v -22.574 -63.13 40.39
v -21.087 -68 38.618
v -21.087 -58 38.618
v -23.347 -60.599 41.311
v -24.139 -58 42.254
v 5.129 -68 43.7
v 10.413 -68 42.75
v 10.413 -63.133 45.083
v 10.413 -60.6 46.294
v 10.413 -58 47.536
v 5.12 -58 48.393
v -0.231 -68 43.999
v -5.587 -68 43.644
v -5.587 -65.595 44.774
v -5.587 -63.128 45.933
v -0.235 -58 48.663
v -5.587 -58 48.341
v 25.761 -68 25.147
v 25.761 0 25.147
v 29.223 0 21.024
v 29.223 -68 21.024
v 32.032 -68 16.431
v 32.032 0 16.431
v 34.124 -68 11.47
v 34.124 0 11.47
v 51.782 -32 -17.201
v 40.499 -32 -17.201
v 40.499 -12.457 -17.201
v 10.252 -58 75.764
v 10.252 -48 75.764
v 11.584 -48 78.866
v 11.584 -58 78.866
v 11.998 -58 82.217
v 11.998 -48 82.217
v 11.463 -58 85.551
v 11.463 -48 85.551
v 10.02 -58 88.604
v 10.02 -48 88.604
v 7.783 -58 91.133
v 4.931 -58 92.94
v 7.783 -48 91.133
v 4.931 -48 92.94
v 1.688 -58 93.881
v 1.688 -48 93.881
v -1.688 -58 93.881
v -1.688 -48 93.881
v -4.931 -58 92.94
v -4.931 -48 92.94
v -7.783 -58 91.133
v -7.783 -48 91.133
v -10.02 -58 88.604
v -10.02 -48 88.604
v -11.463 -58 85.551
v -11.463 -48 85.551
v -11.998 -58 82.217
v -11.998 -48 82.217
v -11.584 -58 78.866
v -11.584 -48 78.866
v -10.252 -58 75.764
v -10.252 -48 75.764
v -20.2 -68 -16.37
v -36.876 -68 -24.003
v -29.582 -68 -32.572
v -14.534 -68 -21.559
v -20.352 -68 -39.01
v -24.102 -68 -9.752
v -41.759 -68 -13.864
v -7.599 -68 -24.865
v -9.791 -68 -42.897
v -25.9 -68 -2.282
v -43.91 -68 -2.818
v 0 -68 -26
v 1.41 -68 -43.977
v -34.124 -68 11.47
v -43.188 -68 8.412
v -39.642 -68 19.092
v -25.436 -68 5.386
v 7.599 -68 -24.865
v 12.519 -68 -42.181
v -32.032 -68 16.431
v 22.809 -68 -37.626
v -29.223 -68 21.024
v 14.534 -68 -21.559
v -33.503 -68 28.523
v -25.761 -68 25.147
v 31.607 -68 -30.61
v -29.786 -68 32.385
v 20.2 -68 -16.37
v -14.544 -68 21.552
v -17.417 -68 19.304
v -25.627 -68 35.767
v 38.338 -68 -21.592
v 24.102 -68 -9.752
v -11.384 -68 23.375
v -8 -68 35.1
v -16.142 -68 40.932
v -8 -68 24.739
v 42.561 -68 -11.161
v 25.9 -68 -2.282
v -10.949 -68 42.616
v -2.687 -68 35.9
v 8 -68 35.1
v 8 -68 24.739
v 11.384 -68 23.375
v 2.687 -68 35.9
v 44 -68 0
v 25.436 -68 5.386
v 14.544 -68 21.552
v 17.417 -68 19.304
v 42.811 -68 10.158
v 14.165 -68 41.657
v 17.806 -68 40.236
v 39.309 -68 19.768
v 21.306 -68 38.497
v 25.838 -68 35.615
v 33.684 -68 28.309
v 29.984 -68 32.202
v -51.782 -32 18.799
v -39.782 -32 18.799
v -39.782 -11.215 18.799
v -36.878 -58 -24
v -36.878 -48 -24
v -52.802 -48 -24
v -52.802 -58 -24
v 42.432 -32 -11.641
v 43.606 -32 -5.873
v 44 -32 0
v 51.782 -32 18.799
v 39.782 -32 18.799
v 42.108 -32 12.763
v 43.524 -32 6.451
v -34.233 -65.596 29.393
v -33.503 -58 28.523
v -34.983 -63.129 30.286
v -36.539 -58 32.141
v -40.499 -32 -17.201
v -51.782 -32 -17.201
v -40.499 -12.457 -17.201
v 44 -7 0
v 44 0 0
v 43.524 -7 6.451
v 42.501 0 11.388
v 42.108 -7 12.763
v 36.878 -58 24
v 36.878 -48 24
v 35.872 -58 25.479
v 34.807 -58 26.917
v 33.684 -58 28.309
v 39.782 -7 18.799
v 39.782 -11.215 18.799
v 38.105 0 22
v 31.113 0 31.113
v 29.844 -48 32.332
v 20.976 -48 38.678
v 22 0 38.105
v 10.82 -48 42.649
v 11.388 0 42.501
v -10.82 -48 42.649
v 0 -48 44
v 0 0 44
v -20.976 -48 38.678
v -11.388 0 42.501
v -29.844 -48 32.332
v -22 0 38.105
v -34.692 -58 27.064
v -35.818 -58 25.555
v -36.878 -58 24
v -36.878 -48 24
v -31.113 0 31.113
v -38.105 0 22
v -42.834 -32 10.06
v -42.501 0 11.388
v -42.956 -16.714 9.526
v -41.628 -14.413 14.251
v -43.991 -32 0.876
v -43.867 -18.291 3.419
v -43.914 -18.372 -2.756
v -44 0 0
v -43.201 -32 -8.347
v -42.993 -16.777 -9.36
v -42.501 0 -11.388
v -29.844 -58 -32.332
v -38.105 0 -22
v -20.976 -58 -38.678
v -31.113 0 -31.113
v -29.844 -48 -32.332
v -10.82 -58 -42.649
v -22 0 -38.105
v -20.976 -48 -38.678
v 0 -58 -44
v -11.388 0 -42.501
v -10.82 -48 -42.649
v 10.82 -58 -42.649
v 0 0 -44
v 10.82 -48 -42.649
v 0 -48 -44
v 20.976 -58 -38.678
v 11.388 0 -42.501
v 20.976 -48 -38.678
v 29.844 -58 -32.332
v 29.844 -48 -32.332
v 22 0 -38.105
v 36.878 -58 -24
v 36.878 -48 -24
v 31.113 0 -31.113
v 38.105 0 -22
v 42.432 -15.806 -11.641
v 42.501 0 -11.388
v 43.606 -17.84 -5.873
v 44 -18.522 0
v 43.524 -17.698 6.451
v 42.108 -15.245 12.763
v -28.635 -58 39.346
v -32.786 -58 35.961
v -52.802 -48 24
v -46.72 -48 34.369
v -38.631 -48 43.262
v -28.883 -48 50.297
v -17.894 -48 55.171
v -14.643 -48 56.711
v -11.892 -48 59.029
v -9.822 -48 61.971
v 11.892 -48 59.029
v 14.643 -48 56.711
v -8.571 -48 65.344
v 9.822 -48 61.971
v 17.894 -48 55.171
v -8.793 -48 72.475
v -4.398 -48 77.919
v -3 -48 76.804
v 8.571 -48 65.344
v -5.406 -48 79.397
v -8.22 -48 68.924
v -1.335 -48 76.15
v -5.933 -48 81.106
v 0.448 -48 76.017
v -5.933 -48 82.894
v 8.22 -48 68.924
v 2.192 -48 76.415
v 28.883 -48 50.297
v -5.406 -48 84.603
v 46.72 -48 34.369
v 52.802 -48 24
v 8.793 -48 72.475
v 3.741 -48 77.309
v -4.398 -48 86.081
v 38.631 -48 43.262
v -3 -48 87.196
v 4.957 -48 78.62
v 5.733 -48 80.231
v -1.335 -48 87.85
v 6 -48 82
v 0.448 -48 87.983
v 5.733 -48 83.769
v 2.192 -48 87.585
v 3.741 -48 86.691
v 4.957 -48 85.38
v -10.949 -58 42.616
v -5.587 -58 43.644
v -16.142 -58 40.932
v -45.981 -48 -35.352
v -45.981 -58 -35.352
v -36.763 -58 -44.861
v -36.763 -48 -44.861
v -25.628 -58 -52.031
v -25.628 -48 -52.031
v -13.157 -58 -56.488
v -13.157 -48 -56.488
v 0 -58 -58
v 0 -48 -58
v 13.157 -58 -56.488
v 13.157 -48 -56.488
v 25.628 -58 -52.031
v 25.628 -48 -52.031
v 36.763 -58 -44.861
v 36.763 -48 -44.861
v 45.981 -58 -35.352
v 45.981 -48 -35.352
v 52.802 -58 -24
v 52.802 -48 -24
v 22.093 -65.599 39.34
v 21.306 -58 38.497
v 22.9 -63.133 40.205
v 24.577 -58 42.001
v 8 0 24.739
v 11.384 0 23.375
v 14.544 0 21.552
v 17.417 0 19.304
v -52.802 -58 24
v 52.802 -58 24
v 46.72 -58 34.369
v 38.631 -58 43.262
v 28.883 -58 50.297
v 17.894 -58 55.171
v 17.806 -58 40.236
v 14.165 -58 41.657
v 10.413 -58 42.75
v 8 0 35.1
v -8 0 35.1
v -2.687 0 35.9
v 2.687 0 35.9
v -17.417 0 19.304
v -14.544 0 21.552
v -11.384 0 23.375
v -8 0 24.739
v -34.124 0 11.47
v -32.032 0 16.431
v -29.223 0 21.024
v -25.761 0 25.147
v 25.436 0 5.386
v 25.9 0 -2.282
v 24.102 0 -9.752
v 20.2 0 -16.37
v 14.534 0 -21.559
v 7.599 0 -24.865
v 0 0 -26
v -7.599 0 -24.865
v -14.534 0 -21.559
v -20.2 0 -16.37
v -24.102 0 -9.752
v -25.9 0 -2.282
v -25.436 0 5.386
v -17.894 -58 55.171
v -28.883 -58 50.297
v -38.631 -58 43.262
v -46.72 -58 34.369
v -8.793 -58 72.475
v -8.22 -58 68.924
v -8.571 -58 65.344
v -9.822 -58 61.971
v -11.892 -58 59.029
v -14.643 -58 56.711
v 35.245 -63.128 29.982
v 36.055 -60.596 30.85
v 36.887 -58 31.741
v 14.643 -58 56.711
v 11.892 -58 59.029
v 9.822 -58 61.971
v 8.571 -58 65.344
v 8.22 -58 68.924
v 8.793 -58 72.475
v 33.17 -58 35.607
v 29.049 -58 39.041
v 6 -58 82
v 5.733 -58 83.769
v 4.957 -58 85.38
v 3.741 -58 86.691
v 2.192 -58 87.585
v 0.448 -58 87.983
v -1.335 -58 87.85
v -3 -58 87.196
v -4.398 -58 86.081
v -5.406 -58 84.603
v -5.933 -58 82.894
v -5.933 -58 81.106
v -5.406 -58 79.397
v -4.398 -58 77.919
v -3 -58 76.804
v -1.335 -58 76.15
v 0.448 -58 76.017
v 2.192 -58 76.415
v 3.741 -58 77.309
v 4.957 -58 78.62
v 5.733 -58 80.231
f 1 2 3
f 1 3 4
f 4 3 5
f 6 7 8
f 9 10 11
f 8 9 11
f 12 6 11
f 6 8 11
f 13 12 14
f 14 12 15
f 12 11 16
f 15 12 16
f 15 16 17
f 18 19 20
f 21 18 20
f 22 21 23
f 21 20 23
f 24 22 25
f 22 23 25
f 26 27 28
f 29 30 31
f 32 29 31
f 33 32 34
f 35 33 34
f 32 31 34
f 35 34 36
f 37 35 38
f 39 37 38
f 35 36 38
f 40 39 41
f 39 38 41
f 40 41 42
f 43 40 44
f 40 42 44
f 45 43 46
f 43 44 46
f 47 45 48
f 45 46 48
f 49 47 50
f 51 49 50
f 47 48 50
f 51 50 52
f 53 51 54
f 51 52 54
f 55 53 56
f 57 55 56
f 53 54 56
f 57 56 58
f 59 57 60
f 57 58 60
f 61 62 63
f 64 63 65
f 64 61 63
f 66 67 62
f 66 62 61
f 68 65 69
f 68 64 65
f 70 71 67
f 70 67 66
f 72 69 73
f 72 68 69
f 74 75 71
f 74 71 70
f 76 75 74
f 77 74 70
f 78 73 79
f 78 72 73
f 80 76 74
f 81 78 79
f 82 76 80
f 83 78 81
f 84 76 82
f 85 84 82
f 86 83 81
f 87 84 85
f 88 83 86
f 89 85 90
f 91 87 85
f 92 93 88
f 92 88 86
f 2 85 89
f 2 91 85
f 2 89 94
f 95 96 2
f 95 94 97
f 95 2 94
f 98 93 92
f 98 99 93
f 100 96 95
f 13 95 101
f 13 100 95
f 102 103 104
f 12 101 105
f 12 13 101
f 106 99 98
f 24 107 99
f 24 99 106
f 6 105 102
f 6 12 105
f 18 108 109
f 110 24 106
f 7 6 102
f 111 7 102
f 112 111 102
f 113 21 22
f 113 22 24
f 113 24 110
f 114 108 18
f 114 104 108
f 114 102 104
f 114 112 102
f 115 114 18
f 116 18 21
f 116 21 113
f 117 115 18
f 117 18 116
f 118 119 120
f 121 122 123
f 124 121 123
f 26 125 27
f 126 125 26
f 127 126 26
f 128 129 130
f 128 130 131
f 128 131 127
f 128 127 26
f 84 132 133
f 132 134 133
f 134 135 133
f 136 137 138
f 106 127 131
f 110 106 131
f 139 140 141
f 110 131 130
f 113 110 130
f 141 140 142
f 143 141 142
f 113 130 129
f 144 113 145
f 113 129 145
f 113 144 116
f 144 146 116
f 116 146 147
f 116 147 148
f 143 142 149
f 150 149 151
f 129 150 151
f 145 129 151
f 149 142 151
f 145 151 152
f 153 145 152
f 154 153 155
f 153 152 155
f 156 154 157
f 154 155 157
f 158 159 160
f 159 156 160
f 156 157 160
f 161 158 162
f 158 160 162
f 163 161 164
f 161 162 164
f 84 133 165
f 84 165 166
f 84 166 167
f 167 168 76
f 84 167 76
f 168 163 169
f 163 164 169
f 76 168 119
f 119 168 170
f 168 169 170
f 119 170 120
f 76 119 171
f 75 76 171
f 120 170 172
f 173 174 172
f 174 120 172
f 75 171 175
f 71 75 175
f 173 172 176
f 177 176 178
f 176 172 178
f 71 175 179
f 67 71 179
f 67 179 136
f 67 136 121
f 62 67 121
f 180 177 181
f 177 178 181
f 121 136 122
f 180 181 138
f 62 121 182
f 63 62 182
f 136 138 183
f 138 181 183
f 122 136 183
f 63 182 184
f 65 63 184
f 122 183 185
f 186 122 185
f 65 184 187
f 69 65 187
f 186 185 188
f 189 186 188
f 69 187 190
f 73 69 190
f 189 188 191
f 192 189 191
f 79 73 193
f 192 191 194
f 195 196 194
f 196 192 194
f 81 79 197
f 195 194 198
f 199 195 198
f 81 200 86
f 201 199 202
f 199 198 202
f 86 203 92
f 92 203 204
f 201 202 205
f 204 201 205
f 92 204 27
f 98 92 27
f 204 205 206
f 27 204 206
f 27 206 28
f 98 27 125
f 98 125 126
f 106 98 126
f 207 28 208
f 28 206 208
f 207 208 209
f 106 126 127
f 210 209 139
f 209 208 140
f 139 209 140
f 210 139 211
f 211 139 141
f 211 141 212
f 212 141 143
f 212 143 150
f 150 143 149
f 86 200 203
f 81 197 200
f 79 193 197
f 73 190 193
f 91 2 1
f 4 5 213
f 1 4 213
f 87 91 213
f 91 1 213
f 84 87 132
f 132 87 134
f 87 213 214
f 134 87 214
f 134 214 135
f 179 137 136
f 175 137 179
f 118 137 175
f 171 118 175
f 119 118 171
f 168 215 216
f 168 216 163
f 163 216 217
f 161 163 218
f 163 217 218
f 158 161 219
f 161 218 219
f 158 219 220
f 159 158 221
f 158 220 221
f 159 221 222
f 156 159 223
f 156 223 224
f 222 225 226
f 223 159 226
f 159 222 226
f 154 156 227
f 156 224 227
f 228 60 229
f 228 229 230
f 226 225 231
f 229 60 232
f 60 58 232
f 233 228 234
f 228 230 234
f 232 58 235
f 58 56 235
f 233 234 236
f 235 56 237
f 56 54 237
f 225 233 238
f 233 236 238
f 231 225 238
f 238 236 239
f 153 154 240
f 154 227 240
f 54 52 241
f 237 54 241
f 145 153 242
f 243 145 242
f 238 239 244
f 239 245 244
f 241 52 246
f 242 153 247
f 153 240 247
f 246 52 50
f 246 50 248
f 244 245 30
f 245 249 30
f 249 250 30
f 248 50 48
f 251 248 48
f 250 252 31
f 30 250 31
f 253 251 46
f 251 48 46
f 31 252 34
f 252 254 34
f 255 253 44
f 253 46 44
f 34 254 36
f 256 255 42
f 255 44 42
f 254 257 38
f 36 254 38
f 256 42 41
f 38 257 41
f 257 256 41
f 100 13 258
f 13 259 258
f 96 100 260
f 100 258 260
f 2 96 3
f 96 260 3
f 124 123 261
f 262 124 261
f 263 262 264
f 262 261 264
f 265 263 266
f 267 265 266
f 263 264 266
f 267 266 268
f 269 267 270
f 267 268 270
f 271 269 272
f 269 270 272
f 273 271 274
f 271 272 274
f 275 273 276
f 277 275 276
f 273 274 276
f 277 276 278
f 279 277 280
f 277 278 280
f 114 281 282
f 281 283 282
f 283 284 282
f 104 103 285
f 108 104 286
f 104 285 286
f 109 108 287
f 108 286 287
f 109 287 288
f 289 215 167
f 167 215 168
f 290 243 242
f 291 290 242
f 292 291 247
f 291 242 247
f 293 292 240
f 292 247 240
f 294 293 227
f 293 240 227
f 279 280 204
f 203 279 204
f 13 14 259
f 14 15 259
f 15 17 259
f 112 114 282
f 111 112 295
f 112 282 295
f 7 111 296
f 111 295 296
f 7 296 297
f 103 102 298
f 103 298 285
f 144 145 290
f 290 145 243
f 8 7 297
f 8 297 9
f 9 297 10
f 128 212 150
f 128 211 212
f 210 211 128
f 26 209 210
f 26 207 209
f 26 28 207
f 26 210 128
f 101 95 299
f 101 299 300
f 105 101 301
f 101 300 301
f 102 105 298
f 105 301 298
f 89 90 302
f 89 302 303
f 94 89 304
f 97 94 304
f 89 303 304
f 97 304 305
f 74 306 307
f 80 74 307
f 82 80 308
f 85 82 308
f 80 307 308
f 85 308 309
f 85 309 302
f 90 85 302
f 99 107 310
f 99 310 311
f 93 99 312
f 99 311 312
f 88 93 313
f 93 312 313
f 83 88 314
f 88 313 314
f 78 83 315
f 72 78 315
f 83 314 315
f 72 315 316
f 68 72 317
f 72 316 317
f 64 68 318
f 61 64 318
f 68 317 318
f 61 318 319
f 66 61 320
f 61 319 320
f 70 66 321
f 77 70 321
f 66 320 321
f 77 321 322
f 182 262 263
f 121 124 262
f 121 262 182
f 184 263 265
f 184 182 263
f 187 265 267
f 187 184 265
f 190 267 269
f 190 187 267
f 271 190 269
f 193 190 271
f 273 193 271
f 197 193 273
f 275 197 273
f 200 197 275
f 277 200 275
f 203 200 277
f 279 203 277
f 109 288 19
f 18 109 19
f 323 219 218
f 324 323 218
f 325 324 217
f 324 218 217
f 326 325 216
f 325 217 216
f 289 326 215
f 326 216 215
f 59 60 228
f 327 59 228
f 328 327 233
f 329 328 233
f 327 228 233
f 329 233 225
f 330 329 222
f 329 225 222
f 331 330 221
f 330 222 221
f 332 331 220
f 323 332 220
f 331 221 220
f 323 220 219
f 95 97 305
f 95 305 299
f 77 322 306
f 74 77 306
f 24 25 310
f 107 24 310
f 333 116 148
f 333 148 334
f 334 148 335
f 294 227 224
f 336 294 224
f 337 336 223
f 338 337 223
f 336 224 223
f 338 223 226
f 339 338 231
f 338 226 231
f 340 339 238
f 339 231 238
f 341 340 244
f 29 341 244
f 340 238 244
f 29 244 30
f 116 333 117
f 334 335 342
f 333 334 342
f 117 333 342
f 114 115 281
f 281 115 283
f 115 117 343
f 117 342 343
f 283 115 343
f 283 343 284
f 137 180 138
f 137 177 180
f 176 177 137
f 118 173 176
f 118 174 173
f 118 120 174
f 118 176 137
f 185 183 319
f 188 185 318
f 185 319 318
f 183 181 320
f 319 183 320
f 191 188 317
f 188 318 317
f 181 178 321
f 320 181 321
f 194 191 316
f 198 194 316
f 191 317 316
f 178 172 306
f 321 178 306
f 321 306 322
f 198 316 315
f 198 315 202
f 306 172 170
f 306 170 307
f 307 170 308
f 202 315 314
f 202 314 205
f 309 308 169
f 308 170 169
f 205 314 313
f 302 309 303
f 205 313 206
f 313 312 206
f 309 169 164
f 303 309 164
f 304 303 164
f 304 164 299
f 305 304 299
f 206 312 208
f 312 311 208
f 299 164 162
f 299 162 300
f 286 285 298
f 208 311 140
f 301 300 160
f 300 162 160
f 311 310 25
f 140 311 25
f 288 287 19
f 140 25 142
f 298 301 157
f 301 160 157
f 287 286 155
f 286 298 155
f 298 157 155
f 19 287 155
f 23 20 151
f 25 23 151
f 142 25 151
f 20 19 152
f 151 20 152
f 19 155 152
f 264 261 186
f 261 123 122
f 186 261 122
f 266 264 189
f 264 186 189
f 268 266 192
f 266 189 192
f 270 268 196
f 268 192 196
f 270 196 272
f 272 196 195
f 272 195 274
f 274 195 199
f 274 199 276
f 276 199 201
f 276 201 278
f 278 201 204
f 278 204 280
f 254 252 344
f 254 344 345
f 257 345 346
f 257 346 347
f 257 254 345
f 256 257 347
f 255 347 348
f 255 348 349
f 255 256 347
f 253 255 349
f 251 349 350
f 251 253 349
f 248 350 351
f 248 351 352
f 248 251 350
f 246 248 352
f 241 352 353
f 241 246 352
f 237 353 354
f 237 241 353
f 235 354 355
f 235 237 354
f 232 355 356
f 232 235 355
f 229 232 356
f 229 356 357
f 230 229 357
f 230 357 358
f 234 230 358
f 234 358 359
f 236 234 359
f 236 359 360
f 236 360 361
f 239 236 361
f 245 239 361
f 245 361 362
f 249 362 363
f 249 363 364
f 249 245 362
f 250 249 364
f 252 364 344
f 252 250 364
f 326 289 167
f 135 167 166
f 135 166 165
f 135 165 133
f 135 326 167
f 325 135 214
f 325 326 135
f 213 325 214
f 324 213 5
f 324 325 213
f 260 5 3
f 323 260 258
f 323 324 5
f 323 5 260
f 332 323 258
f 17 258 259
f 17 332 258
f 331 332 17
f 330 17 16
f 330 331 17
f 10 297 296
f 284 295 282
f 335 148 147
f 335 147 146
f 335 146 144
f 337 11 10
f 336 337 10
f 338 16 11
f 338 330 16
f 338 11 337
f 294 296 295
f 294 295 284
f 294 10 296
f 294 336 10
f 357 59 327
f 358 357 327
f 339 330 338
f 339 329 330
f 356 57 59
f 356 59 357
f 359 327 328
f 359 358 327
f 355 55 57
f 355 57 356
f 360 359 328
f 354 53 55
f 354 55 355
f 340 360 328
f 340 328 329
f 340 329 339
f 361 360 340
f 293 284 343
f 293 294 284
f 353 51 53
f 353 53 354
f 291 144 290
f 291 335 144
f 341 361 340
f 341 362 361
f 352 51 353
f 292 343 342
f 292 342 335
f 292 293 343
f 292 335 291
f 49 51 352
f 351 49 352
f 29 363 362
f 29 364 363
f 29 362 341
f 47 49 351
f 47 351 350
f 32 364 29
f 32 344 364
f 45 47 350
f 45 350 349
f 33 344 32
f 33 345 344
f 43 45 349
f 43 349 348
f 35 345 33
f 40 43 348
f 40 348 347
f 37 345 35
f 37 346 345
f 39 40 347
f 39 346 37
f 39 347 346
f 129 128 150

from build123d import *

# Parameters (mm, degrees)
F0_R         = 44
F1_DEPTH     = 68
F3_R         = 6
F4_DEPTH     = 10
F7_DEPTH     = 10
F8_T4_ANGLE  = 83.7942350081
F8_T9_ANGLE  = 83.7884226617
F8_T14_ANGLE = 83.7665747307
F11_DEPTH    = 25
F12_T4_DEPTH = 165.3542877323
F12_S5_R     = 44
F12_T6_DEPTH = 86
F13_T4_DEPTH = 165.3542877323
F13_S5_R     = 44
F13_T6_DEPTH = 85


# Not quite as in the source:
# - a fillet or chamfer that OpenCascade refuses, or shapes differently, is made with other operations: its cross-section is extruded or revolved along the edge and cut away or added


with BuildPart() as f1:
    # F0 (on Front) → F1 (new body)
    with BuildSketch(Plane.XZ):
        Circle(F0_R)
        with BuildLine():
            ThreePointArc((-17.4170906965, 19.3040138746), (-12.9958030986, 22.5190830591), (-8, 24.7386337537))
            Line((-8, 24.7386337537), (-8, 35.0998575496))
            ThreePointArc((-8, 35.0998575496), (0, 36), (8, 35.0998575496))
            Line((8, 35.0998575496), (8, 24.7386337537))
            ThreePointArc((8, 24.7386337537), (12.9958030986, 22.5190830591), (17.4170906965, 19.3040138746))
            Line((17.4170906965, 19.3040138746), (25.7612918983, 25.1466864563))
            ThreePointArc((25.7612918983, 25.1466864563), (30.7135727536, 18.7796818053), (34.1239224392, 11.4698699802))
            Line((34.1239224392, 11.4698699802), (25.4359194285, 5.3864647801))
            ThreePointArc((25.4359194285, 5.3864647801), (0, -26), (-25.4359194285, 5.3864647801))
            Line((-25.4359194285, 5.3864647801), (-34.1239224392, 11.4698699802))
            ThreePointArc((-34.1239224392, 11.4698699802), (-30.7135727536, 18.7796818053), (-25.7612918983, 25.1466864563))
            Line((-25.7612918983, 25.1466864563), (-17.4170906965, 19.3040138746))
        make_face(mode=Mode.SUBTRACT)
    extrude(amount=F1_DEPTH)

    # F3 (on offset) → F4 (join)
    with BuildSketch(Plane.XZ.offset(48)):
        with BuildLine():
            ThreePointArc((-10.252187236, 75.7636022514), (-9.0876412514, 63.6171726174), (-17.8938638331, 55.1707317073))
            ThreePointArc((-17.8938638331, 55.1707317073), (-38.6311115614, 43.2624227191), (-52.8015151298, 24))
            Line((-52.8015151298, 24), (-36.8781778292, 24))
            ThreePointArc((-36.8781778292, 24), (0, 44), (36.8781778292, 24))
            Line((36.8781778292, 24), (52.8015151298, 24))
            ThreePointArc((52.8015151298, 24), (38.6311115614, 43.2624227191), (17.8938638331, 55.1707317073))
            ThreePointArc((17.8938638331, 55.1707317073), (9.0876412514, 63.6171726174), (10.252187236, 75.7636022514))
            ThreePointArc((10.252187236, 75.7636022514), (0, 94), (-10.252187236, 75.7636022514))
        make_face()
        with Locations((0, 82)):
            Circle(F3_R, mode=Mode.SUBTRACT)
        with BuildLine():
            ThreePointArc((36.8781778292, -24), (0, -44), (-36.8781778292, -24))
            Line((-36.8781778292, -24), (-52.8015151298, -24))
            ThreePointArc((-52.8015151298, -24), (0, -58), (52.8015151298, -24))
            Line((52.8015151298, -24), (36.8781778292, -24))
        make_face()
    extrude(amount=F4_DEPTH)

    # F6 (on offset) → F7 (join)
    with BuildSketch(Plane.XZ.offset(58)):
        with BuildLine():
            Line((-36.7577330787, 32.4016829643), (-33.5029734135, 28.5228114402))
            ThreePointArc((-33.5029734135, 28.5228114402), (-27.7578301996, 34.1394619555), (-21.0871377876, 38.6177759578))
            Line((-21.0871377876, 38.6177759578), (-24.3586089556, 42.5165634753))
            ThreePointArc((-24.3586089556, 42.5165634753), (-30.9738521636, 37.9686776455), (-36.7577330787, 32.4016829643))
        make_face()
        with BuildLine():
            ThreePointArc((-5.5873169023, 43.6438070043), (2.4537097938, 43.9315297736), (10.4126830977, 42.7501582536))
            Line((10.4126830977, 42.7501582536), (10.4126830977, 47.8808524434))
            ThreePointArc((10.4126830977, 47.8808524434), (2.4455798994, 48.9389327525), (-5.5873169023, 48.6804056046))
            Line((-5.5873169023, 48.6804056046), (-5.5873169023, 43.6438070043))
        make_face()
        with BuildLine():
            Line((33.6836647587, 28.3091986539), (37.1178360984, 31.9885329982))
            ThreePointArc((37.1178360984, 31.9885329982), (31.3875014297, 37.6274468175), (24.8122261451, 42.2534428624))
            Line((24.8122261451, 42.2534428624), (21.306338137, 38.4972720487))
            ThreePointArc((21.306338137, 38.4972720487), (27.9629096213, 33.9716894709), (33.6836647587, 28.3091986539))
        make_face()
    extrude(amount=F7_DEPTH)

    # F8: chamfer of 5 x 10.7225346025 on 3 edges, made by hand


with BuildPart() as f8_tool2:
    # F8_s3 → F8_t4 (revolve)
    with BuildSketch(Plane(origin=(0, 0, 0), x_dir=(0, 1, 0), z_dir=(0.1438242317, 0, -0.989603249))):
        Polygon((-68, 44), (-57.2774653975, 49), (-68, 49), align=None)
    revolve(axis=Axis((0, -68, 0), (0, -1, 0)), revolution_arc=F8_T4_ANGLE)

    split(bisect_by=Plane.XZ.offset(58), keep=Keep.TOP)


with BuildPart() as f1_1:
    add(f1.part)

    # F8_t1: cut F8_tool2
    add(f8_tool2.part, mode=Mode.SUBTRACT)


with BuildPart() as f8_tool7:
    # F8_s8 → F8_t9 (revolve)
    with BuildSketch(Plane(origin=(0, 0, 0), x_dir=(0, 1, 0), z_dir=(0.7101236851, 0, -0.7040769502))):
        Polygon((-68, 44), (-57.2774653975, 49), (-68, 49), align=None)
    revolve(axis=Axis((0, -68, 0), (0, -1, 0)), revolution_arc=F8_T9_ANGLE)

    split(bisect_by=Plane.XZ.offset(58), keep=Keep.TOP)


with BuildPart() as f1_2:
    add(f1_1.part)

    # F8_t6: cut F8_tool7
    add(f8_tool7.part, mode=Mode.SUBTRACT)


with BuildPart() as f8_tool12:
    # F8_s13 → F8_t14 (revolve)
    with BuildSketch(Plane(origin=(0, 0, 0), x_dir=(0, 1, 0), z_dir=(0.9989090113, 0, -0.0466988996))):
        Polygon((-68, 44), (-57.2774653975, 49), (-68, 49), align=None)
    revolve(axis=Axis((0, -68, 0), (0, -1, 0)), revolution_arc=F8_T14_ANGLE)

    split(bisect_by=Plane.XZ.offset(58), keep=Keep.TOP)


with BuildPart() as f1_3:
    add(f1_2.part)

    # F8_t11: cut F8_tool12
    add(f8_tool12.part, mode=Mode.SUBTRACT)

    # F10 (on offset) → F11 (join)
    with BuildSketch(Plane.XZ.offset(32)):
        with BuildLine():
            ThreePointArc((39.7816943244, 18.7993828803), (42.9324734337, 9.6334170917), (44, 0))
            ThreePointArc((44, 0), (43.1157719293, -8.7766856466), (40.4986267755, -17.2006171197))
            Line((40.4986267755, -17.2006171197), (51.7816943244, -17.2006171197))
            Line((51.7816943244, -17.2006171197), (51.7816943244, 18.7993828803))
            Line((51.7816943244, 18.7993828803), (39.7816943244, 18.7993828803))
        make_face()
        with BuildLine():
            ThreePointArc((-40.4986267755, -17.2006171197), (-43.9912774192, 0.8760770652), (-39.7816943244, 18.7993828803))
            Line((-39.7816943244, 18.7993828803), (-51.7816943244, 18.7993828803))
            Line((-51.7816943244, 18.7993828803), (-51.7816943244, -17.2006171197))
            Line((-51.7816943244, -17.2006171197), (-40.4986267755, -17.2006171197))
        make_face()
    extrude(amount=-F11_DEPTH)

    # F12: chamfer of 25 x 14.4337567297 on 1 edges, made by hand


with BuildPart() as f12_tool2:
    # F12_s3 → F12_t4 (new body)
    with BuildSketch(Plane.XY.offset(-81.8777609858)):
        with BuildLine():
            Line((36.8479375946, -6.1339745962), (52.2816943244, -32.8660254038))
            Line((52.2816943244, -32.8660254038), (52.7816943244, -32.8660254038))
            ThreePointArc((52.7816943244, -32.8660254038), (52.2816943244, -19.9330127019), (52.2816943244, -7))
            Line((52.2816943244, -7), (51.7816943244, -6.5))
            ThreePointArc((51.7816943244, -6.5), (44.3148159595, -6.5), (36.8479375946, -5.6339745962))
            Line((36.8479375946, -5.6339745962), (36.8479375946, -6.1339745962))
        make_face()
    extrude(amount=F12_T4_DEPTH)

    # F12_s5 → F12_t6 (cut, symmetric)
    with BuildSketch(Plane.XZ.offset(19.3)):
        Circle(F12_S5_R)
    extrude(amount=F12_T6_DEPTH, both=True, mode=Mode.SUBTRACT)


with BuildPart() as f1_4:
    add(f1_3.part)

    # F12_t1: cut F12_tool2
    add(f12_tool2.part, mode=Mode.SUBTRACT)

    # F13: chamfer of 25 x 14.4337567297 on 1 edges, made by hand


with BuildPart() as f13_tool2:
    # F13_s3 → F13_t4 (new body)
    with BuildSketch(Plane.XY.offset(83.4765267465)):
        Polygon((-37.3479375946, -7), (-51.7816943244, -32), (-51.7816943244, -7), align=None)
    extrude(amount=-F13_T4_DEPTH)

    # F13_s5 → F13_t6 (cut, symmetric)
    with BuildSketch(Plane.XZ.offset(19.5)):
        Circle(F13_S5_R)
    extrude(amount=F13_T6_DEPTH, both=True, mode=Mode.SUBTRACT)


with BuildPart() as f1_5:
    add(f1_4.part)

    # F13_t1: cut F13_tool2
    add(f13_tool2.part, mode=Mode.SUBTRACT)


solid = f1_5.part
